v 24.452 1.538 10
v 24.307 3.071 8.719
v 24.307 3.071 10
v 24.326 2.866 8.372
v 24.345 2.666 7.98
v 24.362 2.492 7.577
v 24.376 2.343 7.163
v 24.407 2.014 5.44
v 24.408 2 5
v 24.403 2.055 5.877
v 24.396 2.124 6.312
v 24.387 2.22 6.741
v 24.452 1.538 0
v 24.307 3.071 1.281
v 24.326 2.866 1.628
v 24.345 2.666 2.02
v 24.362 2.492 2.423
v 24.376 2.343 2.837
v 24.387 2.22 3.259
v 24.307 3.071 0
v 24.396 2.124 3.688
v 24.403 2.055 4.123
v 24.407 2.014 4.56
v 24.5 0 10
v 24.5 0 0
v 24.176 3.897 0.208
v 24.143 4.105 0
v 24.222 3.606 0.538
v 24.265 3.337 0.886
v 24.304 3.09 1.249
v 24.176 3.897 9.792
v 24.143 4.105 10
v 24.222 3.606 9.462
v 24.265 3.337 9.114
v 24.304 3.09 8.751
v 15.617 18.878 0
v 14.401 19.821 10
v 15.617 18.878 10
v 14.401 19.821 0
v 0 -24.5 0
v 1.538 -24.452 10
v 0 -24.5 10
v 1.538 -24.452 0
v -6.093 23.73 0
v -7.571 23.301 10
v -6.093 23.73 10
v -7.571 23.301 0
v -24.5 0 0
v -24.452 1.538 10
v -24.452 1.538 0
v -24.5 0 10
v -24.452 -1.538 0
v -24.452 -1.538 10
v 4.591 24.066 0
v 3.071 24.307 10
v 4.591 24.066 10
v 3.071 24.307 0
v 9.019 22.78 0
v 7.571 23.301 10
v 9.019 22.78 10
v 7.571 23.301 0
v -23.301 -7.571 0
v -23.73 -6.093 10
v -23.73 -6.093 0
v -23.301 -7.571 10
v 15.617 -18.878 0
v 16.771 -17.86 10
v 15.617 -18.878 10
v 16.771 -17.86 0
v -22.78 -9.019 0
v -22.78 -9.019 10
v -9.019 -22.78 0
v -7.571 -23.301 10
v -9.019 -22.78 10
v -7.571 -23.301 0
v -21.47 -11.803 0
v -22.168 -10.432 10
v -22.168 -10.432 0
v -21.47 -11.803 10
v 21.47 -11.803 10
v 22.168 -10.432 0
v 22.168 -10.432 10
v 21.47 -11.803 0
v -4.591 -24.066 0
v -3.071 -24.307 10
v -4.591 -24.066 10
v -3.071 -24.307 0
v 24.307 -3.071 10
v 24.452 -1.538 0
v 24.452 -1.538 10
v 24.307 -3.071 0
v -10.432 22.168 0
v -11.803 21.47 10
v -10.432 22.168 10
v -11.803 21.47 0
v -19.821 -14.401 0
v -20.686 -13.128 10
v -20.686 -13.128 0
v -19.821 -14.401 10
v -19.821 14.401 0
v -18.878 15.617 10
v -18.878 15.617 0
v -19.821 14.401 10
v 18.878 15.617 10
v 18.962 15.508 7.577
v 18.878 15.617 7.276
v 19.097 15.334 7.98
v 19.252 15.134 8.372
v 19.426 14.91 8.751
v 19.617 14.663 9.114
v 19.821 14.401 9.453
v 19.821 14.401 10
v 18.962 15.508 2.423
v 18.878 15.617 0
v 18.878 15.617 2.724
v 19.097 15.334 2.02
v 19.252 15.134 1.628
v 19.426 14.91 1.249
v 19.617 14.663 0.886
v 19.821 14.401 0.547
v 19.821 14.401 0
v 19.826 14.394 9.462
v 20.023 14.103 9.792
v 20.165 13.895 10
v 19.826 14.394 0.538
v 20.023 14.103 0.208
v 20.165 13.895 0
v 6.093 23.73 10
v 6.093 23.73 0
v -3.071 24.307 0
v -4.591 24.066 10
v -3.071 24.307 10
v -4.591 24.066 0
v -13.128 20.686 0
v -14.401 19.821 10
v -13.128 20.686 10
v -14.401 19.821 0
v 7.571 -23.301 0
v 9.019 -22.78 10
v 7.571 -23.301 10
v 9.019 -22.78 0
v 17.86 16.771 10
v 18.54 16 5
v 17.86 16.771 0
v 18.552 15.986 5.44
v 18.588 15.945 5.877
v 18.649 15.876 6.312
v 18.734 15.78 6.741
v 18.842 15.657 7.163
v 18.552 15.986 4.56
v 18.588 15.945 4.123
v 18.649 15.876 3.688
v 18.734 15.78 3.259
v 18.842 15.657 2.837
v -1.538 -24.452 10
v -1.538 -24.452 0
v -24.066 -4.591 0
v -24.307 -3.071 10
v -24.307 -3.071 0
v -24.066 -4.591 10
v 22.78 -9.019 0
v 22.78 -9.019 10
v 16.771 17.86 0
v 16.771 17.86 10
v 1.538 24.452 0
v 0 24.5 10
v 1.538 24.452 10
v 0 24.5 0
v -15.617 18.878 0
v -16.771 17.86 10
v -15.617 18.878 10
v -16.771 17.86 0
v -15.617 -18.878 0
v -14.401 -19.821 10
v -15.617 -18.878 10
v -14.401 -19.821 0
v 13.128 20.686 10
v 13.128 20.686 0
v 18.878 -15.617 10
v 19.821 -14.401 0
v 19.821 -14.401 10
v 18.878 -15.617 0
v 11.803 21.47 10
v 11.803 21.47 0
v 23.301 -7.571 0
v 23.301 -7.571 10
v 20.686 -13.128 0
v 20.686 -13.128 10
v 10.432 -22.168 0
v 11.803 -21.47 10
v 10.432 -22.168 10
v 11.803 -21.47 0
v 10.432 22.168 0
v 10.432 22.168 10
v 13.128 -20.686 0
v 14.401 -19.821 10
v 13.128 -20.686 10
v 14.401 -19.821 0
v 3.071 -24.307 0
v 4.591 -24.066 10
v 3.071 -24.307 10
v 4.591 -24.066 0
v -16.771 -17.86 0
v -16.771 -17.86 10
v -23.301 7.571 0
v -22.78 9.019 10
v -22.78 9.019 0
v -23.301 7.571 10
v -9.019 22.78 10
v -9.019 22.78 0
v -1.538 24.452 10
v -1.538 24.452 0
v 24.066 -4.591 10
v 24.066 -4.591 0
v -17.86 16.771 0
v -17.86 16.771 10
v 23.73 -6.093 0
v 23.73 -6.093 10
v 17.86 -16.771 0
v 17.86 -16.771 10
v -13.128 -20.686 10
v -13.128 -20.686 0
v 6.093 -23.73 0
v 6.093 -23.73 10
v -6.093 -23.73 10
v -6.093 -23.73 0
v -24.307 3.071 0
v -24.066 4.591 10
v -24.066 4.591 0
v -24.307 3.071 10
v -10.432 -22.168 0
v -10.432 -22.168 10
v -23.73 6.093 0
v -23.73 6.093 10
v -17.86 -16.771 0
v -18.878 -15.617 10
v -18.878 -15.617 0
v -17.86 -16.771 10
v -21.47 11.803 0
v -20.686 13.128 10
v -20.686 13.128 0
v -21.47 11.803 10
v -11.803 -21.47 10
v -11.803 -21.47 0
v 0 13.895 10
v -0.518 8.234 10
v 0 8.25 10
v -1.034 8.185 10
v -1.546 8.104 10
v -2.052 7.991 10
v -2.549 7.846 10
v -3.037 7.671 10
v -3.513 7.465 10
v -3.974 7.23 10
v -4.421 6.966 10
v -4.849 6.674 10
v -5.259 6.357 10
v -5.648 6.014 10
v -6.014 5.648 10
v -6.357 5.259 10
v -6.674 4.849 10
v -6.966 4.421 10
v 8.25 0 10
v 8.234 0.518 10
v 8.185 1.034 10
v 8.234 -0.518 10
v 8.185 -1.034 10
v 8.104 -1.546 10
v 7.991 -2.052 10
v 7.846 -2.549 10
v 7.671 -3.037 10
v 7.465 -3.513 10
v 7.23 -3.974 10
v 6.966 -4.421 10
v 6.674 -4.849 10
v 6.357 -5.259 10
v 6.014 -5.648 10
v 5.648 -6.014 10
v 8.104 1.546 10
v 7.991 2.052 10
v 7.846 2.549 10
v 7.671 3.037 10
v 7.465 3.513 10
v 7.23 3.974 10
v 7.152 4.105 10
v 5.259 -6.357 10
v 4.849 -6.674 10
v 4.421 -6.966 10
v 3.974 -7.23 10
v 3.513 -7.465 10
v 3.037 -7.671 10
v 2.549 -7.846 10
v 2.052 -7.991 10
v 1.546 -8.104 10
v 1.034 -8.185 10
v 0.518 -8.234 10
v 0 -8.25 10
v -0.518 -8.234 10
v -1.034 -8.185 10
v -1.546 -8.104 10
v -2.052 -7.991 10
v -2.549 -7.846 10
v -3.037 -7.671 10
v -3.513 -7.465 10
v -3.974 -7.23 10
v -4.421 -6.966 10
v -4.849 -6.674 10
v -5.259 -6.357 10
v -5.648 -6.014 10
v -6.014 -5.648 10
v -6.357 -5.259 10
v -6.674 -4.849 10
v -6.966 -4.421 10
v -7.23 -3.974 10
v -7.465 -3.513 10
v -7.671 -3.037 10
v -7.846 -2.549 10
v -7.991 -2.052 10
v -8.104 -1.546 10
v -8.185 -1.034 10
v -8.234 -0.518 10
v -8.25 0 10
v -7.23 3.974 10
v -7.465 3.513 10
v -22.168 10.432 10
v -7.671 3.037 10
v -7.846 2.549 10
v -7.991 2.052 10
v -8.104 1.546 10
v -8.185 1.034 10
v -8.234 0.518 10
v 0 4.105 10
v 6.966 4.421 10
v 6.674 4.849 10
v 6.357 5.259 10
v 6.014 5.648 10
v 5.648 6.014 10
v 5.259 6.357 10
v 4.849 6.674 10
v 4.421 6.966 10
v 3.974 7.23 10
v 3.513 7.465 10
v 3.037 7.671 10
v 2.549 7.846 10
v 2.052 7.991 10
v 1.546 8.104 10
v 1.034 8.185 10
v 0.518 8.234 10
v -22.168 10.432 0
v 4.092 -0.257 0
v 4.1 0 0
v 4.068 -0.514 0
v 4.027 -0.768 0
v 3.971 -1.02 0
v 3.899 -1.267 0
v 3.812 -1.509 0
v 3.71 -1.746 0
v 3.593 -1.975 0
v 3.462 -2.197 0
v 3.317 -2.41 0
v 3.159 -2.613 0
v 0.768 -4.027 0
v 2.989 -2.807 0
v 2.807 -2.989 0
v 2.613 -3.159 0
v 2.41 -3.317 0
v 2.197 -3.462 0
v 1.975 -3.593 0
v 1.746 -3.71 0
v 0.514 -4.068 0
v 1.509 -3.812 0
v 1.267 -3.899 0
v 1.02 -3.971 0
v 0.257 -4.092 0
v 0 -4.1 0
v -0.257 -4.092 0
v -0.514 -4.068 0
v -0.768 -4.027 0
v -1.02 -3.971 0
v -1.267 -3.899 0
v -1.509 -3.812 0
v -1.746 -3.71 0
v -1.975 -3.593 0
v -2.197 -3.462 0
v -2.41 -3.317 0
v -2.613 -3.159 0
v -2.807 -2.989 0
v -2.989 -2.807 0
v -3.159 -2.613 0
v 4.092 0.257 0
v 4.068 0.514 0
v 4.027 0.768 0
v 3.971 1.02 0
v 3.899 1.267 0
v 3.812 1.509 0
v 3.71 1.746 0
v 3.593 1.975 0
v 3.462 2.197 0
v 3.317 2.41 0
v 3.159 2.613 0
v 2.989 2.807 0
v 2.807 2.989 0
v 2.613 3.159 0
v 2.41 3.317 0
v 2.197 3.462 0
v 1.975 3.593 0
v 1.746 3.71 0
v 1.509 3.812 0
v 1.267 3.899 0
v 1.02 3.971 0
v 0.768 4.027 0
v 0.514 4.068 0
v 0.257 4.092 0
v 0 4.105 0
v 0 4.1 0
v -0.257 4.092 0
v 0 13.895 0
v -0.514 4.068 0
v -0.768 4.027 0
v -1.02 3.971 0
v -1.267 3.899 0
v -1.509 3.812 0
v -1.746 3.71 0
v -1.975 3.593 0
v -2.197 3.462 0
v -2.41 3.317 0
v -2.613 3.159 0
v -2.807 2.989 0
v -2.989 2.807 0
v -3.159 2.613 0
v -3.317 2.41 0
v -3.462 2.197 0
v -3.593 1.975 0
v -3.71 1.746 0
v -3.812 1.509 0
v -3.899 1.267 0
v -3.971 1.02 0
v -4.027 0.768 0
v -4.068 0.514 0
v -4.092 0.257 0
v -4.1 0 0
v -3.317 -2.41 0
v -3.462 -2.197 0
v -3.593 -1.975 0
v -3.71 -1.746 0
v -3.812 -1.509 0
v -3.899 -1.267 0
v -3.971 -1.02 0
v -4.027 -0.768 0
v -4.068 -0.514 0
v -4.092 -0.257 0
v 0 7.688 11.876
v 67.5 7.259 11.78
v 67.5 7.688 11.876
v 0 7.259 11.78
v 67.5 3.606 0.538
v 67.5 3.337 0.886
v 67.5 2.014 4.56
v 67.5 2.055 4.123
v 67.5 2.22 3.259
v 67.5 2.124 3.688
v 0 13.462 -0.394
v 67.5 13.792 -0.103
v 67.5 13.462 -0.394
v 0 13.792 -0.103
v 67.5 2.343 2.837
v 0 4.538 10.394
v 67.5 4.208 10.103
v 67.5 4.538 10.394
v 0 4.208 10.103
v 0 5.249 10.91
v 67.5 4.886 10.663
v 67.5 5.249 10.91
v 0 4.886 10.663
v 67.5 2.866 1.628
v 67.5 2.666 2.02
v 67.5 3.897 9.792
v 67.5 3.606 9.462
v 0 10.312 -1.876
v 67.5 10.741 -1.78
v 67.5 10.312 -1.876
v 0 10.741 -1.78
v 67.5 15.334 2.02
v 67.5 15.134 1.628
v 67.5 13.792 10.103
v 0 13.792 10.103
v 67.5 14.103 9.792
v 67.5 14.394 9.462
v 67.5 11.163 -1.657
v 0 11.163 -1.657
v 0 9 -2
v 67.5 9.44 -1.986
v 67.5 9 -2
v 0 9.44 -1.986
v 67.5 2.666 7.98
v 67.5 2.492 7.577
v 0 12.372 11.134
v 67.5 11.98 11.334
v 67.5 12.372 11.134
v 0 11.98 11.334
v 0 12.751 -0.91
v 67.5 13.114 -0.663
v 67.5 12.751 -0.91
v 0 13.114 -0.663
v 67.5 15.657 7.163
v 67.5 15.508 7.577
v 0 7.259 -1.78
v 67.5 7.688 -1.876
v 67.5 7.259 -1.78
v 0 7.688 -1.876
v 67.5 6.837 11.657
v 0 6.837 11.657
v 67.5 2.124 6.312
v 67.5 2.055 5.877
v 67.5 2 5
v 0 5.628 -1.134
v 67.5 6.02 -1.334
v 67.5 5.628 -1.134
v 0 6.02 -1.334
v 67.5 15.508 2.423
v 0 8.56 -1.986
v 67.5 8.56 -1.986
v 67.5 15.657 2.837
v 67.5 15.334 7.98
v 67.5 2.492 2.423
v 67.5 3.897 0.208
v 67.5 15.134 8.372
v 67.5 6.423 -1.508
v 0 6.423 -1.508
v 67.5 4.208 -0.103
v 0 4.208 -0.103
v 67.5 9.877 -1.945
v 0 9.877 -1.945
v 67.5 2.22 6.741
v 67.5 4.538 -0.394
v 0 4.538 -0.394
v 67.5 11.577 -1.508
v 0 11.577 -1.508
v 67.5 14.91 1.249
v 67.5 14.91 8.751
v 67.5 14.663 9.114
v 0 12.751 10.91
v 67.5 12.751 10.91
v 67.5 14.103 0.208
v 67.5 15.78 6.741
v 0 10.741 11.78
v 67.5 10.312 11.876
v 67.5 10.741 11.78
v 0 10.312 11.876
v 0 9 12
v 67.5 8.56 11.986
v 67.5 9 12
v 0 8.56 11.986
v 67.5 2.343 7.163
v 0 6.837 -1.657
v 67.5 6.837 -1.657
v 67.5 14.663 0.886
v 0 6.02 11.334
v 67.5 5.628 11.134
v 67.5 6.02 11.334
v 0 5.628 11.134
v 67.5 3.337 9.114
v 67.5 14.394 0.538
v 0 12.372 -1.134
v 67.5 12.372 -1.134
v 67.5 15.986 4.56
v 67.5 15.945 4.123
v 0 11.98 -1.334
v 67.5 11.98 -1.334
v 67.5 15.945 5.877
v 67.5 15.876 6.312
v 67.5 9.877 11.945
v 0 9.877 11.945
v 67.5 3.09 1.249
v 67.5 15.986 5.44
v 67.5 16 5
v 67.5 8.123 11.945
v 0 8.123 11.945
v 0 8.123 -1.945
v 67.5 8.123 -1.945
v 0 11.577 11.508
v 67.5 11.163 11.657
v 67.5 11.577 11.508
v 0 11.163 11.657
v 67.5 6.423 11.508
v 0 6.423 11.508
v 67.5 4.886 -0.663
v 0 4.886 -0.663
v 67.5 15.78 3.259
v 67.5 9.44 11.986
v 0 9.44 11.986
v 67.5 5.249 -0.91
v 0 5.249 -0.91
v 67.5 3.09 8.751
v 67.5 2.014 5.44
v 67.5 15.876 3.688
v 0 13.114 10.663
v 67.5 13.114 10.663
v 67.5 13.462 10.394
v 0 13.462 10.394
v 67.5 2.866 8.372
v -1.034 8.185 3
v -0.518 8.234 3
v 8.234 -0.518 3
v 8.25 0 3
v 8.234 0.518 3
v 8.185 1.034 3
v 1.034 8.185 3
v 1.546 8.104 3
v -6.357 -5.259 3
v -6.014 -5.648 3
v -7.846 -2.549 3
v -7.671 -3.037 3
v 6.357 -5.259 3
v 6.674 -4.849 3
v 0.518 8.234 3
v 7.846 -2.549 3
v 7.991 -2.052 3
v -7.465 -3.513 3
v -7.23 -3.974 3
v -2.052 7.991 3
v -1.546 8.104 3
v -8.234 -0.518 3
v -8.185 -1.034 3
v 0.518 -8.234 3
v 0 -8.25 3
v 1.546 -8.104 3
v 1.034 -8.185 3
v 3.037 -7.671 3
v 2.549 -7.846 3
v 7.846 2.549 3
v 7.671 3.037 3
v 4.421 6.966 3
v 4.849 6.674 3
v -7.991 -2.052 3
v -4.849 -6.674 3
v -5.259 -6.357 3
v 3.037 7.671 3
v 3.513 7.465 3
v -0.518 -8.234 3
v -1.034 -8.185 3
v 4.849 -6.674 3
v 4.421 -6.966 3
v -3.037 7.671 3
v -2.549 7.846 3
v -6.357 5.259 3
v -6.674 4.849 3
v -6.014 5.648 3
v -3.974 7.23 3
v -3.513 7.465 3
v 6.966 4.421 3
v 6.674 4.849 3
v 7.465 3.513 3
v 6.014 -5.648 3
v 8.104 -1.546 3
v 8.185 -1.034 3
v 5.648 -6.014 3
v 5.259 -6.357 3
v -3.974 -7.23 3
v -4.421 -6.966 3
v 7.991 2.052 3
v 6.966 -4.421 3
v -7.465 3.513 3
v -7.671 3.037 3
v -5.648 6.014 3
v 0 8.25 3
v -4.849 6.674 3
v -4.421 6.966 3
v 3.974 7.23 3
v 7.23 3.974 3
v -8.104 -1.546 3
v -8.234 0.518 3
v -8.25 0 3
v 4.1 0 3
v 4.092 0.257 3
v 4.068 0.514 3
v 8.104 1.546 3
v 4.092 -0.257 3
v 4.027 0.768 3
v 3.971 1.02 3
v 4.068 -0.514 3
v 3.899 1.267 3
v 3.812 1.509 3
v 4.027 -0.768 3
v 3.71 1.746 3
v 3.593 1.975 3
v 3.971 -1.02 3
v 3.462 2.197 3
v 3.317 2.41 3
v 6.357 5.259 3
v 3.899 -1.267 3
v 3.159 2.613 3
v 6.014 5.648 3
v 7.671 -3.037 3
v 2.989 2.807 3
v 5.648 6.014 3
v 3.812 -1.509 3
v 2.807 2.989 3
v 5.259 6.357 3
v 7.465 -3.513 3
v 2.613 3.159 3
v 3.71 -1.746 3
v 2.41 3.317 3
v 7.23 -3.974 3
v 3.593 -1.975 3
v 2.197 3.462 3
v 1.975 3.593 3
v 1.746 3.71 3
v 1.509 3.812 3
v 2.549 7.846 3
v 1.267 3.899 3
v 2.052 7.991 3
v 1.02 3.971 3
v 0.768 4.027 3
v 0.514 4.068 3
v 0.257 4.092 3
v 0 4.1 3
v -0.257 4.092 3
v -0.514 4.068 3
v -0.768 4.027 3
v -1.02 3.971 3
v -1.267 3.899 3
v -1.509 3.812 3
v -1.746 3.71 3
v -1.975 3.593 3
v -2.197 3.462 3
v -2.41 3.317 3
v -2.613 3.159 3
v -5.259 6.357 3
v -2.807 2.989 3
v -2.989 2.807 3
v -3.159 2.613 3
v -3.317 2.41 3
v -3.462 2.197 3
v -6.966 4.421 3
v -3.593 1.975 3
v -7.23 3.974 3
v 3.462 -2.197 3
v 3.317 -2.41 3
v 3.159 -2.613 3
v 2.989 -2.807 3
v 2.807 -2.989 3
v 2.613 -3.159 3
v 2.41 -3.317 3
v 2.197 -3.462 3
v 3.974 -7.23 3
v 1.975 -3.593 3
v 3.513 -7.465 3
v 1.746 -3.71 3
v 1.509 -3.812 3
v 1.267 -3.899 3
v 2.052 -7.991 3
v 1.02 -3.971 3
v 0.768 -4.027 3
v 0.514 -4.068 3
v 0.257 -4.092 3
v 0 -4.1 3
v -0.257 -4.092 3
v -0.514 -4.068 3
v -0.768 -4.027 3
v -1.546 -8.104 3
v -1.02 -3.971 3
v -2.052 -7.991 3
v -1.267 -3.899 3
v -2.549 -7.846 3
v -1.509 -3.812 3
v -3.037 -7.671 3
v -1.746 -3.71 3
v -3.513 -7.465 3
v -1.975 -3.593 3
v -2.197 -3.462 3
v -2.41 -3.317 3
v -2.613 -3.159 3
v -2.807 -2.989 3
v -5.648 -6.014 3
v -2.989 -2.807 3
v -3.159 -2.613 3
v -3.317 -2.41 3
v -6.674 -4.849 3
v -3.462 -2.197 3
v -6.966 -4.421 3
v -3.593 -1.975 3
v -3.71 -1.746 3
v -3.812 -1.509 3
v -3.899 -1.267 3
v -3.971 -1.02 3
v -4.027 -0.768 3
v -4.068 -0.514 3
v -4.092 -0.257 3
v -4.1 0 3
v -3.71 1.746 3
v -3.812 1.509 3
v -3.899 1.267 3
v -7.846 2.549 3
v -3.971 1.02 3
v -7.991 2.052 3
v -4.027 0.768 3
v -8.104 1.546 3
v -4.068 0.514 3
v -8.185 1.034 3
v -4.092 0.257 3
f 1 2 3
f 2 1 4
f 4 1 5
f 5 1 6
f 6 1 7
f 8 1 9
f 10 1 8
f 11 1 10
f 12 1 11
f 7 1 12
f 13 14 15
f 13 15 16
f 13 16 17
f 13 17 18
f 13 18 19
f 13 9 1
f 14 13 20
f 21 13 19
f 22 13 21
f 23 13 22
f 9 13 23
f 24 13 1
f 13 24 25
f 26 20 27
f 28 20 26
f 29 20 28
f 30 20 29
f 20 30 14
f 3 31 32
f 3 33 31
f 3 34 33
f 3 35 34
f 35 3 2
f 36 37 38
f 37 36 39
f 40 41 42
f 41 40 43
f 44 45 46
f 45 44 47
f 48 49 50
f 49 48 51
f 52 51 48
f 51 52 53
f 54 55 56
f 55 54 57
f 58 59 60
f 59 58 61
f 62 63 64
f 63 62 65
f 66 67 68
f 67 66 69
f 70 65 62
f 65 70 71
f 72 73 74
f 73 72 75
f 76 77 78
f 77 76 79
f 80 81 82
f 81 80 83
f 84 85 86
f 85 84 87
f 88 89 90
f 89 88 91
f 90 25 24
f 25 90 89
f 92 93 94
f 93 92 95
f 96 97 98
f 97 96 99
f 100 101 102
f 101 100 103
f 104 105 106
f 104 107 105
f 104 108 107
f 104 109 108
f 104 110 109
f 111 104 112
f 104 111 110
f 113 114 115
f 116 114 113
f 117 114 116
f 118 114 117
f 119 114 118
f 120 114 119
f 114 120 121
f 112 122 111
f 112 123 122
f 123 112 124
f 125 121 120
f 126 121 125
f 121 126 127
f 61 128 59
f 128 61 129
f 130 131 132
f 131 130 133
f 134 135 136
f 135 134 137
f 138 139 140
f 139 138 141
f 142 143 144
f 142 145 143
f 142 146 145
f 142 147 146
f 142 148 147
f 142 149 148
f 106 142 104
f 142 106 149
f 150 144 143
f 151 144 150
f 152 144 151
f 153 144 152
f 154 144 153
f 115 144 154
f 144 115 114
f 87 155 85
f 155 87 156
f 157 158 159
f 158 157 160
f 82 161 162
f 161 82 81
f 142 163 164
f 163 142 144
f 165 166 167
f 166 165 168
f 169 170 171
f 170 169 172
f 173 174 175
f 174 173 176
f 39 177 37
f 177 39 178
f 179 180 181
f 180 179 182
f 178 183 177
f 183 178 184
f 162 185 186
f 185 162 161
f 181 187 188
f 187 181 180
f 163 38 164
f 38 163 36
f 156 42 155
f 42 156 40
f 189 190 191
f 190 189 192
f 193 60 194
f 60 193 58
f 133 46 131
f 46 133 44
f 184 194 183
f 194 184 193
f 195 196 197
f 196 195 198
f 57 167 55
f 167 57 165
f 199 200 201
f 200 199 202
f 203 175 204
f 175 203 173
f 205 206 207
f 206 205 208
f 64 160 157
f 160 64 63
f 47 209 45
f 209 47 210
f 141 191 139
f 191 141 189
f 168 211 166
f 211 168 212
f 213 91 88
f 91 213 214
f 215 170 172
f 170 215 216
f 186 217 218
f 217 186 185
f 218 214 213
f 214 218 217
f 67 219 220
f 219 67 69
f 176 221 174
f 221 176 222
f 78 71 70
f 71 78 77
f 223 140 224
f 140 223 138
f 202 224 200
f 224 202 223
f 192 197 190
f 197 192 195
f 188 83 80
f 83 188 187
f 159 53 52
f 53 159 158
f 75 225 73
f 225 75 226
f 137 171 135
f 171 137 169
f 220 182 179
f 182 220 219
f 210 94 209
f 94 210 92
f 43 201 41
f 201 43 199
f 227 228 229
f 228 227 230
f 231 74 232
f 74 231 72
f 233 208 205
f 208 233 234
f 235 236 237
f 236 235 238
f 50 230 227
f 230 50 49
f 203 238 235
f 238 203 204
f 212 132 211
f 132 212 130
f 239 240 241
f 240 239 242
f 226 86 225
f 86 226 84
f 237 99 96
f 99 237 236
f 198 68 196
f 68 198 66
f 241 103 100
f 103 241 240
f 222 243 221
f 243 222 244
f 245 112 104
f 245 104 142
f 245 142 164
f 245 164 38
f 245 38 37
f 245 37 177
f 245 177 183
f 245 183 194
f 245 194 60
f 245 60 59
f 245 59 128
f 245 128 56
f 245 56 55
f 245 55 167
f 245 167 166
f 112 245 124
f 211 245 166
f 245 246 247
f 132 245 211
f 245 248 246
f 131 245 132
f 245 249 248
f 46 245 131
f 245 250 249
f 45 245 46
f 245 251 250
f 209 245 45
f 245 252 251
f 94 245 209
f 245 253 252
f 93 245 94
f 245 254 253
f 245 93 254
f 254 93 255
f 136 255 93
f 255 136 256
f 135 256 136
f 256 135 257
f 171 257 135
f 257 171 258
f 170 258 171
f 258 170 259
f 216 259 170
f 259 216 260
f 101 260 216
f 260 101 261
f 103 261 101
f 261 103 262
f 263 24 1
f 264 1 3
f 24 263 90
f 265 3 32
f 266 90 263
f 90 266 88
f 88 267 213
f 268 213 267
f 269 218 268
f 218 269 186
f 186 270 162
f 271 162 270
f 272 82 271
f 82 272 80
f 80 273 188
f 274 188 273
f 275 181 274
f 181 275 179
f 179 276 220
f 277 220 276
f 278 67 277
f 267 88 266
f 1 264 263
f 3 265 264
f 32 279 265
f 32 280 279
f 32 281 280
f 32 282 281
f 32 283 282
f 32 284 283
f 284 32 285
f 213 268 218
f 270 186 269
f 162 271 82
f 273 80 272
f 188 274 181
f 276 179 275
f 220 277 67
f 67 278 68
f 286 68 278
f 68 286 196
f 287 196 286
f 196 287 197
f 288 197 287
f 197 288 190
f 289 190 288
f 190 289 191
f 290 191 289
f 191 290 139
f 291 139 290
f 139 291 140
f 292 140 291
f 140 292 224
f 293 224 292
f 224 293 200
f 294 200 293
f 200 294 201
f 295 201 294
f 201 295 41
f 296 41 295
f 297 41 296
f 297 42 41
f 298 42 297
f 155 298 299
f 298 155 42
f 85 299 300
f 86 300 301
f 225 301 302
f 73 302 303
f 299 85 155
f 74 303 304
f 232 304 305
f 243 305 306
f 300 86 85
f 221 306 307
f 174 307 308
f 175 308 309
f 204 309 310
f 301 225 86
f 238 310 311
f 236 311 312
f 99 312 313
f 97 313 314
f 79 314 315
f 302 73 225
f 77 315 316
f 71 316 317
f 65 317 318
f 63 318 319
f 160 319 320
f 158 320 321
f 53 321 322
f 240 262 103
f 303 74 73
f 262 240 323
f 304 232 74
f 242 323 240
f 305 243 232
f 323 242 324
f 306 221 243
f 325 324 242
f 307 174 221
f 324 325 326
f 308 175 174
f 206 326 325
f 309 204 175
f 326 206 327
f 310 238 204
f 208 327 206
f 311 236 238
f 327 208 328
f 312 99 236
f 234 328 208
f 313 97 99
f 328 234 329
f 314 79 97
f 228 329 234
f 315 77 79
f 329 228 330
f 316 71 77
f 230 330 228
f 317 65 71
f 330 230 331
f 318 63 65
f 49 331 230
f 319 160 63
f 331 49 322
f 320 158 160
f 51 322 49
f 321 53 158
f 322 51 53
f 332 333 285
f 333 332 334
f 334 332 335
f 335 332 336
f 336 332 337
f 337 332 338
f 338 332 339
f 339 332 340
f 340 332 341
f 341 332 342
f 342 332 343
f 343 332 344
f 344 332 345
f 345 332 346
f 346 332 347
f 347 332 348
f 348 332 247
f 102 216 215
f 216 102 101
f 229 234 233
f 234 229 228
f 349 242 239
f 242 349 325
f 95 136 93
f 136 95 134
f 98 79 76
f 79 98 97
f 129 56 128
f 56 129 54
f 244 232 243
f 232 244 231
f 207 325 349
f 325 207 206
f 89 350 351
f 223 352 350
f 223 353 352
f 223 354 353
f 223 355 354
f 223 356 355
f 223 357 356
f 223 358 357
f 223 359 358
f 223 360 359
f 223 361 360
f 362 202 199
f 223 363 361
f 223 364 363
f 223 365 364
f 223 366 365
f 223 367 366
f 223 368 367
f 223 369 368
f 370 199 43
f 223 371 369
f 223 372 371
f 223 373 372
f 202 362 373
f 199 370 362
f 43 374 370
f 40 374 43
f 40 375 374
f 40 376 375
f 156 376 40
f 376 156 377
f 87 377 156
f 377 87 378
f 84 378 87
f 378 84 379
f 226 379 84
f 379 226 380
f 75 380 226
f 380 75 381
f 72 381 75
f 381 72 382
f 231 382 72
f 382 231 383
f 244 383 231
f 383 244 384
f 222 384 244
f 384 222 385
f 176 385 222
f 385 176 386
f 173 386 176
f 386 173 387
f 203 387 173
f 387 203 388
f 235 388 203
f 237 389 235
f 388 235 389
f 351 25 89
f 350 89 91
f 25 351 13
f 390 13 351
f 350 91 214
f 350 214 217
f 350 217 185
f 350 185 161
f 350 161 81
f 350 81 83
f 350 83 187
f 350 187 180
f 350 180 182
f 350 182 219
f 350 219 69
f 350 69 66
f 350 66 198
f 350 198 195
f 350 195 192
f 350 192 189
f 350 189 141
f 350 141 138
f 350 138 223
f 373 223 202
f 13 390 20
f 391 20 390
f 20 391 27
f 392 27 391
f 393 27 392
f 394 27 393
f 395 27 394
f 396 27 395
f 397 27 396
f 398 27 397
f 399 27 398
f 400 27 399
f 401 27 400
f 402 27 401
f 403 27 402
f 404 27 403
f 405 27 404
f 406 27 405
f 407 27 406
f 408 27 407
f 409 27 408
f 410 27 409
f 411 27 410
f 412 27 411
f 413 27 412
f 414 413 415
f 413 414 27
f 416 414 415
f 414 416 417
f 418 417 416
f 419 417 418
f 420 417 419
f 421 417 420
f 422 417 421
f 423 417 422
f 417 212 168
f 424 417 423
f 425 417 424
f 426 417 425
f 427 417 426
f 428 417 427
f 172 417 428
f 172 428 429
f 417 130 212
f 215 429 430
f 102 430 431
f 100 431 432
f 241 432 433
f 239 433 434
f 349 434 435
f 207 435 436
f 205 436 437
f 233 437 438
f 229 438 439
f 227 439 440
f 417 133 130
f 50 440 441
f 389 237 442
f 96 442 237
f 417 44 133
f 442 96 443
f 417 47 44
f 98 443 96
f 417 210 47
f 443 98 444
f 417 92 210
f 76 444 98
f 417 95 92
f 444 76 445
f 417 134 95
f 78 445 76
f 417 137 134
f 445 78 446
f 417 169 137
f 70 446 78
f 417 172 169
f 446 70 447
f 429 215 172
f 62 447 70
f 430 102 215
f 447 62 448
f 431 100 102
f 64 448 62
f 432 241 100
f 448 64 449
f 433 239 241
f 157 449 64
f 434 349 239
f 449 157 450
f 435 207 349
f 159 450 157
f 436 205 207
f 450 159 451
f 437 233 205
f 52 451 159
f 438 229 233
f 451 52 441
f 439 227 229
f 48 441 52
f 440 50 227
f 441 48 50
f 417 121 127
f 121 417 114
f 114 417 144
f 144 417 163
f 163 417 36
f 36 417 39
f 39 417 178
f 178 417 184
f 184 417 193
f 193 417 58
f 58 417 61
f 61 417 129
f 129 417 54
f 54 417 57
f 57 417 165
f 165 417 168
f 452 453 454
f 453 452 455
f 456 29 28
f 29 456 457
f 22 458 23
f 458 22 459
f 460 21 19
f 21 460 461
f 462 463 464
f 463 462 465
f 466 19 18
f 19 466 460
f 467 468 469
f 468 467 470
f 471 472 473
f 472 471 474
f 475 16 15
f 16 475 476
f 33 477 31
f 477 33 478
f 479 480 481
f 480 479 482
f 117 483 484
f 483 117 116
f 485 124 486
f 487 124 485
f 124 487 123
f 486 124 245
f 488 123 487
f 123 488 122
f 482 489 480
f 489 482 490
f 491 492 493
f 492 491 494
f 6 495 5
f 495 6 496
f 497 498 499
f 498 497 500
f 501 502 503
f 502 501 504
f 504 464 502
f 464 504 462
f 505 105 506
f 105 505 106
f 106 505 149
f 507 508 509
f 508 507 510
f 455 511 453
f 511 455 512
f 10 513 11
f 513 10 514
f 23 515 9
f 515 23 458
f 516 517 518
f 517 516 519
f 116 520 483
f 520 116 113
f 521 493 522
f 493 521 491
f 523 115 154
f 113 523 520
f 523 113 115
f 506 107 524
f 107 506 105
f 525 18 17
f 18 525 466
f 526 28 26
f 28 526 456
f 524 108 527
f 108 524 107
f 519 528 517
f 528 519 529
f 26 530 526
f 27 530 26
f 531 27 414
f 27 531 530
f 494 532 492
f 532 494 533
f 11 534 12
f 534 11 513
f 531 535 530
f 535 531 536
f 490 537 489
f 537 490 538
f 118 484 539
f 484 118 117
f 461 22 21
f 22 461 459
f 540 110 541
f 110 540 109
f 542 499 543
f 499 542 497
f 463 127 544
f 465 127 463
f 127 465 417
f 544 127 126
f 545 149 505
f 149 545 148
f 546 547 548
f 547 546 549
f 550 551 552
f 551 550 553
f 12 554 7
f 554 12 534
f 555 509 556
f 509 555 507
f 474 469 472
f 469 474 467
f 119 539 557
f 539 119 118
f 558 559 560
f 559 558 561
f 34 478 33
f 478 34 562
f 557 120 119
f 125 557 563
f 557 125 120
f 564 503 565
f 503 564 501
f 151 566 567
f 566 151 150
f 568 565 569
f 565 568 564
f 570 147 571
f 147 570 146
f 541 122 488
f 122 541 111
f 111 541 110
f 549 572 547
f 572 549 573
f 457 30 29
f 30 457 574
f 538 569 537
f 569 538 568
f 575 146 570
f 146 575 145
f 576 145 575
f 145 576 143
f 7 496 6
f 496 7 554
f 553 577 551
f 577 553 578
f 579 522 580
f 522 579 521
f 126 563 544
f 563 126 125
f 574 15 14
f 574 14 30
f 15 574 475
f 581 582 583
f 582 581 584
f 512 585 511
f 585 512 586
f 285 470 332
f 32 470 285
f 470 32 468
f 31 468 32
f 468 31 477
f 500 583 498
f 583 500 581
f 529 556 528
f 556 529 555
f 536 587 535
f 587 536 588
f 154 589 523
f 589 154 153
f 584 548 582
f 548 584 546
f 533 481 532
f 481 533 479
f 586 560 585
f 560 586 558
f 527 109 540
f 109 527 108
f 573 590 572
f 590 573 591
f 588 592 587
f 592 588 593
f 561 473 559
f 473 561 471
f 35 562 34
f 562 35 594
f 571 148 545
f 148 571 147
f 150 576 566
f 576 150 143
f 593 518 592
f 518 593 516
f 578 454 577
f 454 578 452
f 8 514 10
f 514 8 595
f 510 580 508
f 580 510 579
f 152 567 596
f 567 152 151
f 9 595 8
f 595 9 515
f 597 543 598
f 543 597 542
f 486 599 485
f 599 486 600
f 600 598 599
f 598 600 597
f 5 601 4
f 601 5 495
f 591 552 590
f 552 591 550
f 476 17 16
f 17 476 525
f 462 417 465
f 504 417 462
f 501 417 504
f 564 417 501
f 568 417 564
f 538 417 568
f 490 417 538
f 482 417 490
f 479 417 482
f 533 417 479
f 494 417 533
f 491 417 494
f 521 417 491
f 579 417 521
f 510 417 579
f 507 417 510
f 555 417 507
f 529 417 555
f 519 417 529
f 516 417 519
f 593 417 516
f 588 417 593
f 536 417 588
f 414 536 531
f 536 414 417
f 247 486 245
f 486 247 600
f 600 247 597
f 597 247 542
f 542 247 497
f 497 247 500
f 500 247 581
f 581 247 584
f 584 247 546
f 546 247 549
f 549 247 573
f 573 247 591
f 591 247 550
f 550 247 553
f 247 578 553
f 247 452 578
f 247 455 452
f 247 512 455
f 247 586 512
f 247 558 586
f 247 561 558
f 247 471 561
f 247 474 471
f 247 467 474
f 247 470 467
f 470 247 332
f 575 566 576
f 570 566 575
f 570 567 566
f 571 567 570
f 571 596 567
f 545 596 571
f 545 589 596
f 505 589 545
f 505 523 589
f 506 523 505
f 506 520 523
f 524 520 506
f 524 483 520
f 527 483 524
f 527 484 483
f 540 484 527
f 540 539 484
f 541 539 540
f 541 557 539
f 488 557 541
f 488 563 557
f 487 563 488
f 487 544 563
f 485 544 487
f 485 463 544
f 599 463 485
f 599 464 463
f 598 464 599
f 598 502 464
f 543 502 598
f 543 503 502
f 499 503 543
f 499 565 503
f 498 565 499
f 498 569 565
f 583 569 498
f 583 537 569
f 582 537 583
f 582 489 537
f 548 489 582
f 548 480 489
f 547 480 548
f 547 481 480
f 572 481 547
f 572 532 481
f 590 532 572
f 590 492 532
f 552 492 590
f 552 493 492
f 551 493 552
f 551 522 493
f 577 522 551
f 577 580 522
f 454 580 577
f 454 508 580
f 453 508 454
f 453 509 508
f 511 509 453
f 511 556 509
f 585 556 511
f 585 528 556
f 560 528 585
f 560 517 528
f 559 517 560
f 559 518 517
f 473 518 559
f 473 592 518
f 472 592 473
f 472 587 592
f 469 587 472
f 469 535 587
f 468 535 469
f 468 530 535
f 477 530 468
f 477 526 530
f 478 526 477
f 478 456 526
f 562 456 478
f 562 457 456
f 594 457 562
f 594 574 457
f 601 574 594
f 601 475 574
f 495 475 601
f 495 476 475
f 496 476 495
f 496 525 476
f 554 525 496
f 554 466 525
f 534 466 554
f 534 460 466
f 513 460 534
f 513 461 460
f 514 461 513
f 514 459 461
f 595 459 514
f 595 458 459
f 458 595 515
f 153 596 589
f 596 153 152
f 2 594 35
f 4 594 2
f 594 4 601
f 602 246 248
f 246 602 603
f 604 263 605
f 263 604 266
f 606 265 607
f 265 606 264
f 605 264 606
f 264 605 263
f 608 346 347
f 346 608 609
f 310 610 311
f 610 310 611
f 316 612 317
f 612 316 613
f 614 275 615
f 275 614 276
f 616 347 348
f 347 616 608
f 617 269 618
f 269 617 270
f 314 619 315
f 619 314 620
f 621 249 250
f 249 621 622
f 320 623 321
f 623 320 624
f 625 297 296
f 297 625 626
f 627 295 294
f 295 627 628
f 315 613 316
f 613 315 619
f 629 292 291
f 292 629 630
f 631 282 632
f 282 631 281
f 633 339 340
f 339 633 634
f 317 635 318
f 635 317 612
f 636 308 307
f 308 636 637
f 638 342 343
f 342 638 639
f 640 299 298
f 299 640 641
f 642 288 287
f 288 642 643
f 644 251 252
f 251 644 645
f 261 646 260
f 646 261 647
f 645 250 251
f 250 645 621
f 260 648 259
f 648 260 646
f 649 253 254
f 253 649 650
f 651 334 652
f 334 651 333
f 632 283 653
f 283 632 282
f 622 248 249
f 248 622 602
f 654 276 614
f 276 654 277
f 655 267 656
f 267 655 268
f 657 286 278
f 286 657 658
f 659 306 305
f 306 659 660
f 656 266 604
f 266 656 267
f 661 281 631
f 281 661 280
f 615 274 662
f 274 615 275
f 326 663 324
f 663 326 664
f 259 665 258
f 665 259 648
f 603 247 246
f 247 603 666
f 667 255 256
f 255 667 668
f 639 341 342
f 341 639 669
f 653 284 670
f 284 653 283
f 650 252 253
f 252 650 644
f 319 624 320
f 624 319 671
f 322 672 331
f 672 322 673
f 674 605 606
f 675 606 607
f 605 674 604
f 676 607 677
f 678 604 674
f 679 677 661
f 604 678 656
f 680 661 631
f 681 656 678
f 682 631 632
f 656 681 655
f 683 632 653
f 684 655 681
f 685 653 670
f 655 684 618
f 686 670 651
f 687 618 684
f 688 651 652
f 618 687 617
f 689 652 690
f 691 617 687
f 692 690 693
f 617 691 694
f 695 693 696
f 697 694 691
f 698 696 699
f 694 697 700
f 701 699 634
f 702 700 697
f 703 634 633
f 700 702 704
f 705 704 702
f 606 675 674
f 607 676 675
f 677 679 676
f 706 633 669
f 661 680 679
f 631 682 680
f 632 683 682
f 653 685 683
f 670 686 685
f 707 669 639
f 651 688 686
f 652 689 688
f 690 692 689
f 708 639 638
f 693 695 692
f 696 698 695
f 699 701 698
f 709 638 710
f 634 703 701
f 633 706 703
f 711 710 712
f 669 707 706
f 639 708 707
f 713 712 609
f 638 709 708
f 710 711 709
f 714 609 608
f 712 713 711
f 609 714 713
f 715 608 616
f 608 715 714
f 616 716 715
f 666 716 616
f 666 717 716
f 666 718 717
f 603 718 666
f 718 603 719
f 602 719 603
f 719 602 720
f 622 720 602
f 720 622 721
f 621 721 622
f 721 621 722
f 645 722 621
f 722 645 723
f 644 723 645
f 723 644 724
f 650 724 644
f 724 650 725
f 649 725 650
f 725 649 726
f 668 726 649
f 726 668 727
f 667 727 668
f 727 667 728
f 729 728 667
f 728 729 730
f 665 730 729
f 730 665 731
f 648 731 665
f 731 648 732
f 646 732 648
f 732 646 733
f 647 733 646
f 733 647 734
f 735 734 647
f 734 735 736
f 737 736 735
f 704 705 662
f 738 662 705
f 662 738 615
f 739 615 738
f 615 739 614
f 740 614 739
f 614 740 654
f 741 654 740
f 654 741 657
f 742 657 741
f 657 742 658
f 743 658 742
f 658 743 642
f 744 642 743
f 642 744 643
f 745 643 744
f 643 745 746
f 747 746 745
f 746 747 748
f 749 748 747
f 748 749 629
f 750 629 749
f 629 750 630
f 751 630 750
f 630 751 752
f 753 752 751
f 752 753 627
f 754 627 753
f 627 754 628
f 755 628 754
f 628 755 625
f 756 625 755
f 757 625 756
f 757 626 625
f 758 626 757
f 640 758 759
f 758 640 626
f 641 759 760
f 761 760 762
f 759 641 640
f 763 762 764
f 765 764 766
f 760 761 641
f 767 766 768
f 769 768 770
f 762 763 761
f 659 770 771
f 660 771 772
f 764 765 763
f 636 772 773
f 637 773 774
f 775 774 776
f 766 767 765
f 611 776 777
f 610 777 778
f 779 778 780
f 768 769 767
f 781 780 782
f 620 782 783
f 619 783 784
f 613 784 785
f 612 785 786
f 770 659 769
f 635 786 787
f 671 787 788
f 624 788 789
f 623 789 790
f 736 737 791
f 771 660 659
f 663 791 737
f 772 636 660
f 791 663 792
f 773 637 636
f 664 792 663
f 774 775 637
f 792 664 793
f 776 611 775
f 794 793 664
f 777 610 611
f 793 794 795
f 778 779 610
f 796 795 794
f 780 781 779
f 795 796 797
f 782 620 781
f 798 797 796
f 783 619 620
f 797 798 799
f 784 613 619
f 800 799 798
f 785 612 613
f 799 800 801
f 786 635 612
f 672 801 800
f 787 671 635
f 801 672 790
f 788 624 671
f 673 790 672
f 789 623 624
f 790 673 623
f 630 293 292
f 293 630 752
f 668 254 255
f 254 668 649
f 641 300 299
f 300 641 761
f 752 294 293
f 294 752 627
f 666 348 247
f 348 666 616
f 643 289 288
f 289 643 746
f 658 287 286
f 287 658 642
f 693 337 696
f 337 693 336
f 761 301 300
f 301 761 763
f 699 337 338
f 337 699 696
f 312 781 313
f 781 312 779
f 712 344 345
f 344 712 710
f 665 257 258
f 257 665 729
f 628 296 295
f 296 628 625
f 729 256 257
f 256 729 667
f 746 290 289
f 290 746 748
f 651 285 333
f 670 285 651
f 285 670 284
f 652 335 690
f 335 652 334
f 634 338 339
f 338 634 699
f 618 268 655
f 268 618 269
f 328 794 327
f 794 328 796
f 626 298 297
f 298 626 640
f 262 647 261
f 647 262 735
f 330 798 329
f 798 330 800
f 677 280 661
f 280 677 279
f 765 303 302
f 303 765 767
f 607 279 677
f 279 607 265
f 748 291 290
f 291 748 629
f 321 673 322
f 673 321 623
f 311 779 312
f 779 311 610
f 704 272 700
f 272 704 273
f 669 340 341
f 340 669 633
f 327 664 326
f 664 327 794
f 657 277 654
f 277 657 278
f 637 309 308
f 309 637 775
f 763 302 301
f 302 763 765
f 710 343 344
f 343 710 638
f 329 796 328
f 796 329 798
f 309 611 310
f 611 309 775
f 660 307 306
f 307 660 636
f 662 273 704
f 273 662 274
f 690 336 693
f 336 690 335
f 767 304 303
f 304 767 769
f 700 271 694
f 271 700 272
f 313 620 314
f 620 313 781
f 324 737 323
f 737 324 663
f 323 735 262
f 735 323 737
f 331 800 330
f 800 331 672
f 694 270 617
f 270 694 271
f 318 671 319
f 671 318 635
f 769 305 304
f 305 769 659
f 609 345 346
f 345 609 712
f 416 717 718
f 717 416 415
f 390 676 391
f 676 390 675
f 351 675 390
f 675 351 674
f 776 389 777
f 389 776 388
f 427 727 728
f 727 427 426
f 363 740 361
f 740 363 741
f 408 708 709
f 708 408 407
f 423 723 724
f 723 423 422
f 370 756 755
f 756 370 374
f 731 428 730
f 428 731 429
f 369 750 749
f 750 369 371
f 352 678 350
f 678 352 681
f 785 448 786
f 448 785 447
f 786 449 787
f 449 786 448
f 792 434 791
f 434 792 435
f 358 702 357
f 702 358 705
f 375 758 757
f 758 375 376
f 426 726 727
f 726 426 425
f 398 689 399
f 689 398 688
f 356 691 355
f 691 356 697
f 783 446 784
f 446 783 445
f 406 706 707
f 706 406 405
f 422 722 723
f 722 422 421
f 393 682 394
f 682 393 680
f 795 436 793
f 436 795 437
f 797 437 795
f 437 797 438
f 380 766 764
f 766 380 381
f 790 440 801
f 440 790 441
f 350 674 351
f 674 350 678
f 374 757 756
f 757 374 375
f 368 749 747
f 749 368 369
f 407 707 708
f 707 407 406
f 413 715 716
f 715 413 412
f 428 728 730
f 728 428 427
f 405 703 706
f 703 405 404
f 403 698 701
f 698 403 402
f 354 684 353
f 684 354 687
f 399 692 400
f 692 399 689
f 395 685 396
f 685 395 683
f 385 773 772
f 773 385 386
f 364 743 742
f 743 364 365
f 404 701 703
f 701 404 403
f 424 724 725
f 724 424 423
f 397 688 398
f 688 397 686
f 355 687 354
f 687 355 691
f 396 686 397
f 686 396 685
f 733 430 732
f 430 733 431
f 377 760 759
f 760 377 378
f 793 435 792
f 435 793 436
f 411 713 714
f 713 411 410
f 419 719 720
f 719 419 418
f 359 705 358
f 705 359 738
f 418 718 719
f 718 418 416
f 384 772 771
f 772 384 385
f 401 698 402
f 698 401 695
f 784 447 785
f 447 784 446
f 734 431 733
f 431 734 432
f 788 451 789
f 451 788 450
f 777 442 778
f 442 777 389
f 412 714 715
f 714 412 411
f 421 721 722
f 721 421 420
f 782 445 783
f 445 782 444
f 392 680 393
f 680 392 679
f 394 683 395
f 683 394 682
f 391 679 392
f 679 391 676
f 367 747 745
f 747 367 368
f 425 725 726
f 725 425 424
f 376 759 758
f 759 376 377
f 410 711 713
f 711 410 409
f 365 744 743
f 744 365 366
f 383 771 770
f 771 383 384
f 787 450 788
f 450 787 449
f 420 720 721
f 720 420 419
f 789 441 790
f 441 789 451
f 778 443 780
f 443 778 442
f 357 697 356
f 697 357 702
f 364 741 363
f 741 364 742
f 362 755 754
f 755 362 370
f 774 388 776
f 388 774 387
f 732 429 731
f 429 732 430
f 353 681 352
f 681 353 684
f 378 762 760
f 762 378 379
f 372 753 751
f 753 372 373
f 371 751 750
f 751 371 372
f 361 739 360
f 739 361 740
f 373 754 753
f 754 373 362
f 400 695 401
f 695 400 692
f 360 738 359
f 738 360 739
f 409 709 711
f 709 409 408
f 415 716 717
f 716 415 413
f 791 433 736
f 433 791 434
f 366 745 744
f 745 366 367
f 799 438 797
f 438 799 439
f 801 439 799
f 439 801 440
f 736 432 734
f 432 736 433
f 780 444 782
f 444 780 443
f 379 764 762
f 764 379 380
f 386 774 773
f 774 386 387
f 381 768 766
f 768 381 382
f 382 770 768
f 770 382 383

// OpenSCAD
//////////////////////////////
// Laundry Rack Hinge Part
//////////////////////////////

// === Parameters ===
disk_d      = 49;
disk_h      = 10;
well_d      = 16.5;
well_depth  = 7;
screw_d     = 8.2;

rod_d       = 14;
rod_y_offset  = 9;     // from disk center to rod axis
rod_z_offset  = disk_h/2;     // from disk center to rod axis
rod_total   = 92;    // distance from disk center to far end

$fn = 100; // smoothness

//////////////////////////////
// === Construction ===
//////////////////////////////

module hinge_part() {
    difference() {
        // --- main solid (disk + rod) ---
        union() {
            // Disk
            cylinder(h = disk_h, d = disk_d);

            // Rod: positioned tangent to disk side
            translate([0, rod_y_offset, rod_z_offset])
                rotate([0,90,0])
                    cylinder(h = rod_total - disk_d/2, d = rod_d);
        }

        // Well (counterbore)
        translate([0,0,disk_h - well_depth])
            cylinder(h = well_depth, d = well_d);

        // Screw hole (through)
        cylinder(h = disk_h + 0.1, d = screw_d);
    }
}

//////////////////////////////
// === Render ===
//////////////////////////////
hinge_part();
